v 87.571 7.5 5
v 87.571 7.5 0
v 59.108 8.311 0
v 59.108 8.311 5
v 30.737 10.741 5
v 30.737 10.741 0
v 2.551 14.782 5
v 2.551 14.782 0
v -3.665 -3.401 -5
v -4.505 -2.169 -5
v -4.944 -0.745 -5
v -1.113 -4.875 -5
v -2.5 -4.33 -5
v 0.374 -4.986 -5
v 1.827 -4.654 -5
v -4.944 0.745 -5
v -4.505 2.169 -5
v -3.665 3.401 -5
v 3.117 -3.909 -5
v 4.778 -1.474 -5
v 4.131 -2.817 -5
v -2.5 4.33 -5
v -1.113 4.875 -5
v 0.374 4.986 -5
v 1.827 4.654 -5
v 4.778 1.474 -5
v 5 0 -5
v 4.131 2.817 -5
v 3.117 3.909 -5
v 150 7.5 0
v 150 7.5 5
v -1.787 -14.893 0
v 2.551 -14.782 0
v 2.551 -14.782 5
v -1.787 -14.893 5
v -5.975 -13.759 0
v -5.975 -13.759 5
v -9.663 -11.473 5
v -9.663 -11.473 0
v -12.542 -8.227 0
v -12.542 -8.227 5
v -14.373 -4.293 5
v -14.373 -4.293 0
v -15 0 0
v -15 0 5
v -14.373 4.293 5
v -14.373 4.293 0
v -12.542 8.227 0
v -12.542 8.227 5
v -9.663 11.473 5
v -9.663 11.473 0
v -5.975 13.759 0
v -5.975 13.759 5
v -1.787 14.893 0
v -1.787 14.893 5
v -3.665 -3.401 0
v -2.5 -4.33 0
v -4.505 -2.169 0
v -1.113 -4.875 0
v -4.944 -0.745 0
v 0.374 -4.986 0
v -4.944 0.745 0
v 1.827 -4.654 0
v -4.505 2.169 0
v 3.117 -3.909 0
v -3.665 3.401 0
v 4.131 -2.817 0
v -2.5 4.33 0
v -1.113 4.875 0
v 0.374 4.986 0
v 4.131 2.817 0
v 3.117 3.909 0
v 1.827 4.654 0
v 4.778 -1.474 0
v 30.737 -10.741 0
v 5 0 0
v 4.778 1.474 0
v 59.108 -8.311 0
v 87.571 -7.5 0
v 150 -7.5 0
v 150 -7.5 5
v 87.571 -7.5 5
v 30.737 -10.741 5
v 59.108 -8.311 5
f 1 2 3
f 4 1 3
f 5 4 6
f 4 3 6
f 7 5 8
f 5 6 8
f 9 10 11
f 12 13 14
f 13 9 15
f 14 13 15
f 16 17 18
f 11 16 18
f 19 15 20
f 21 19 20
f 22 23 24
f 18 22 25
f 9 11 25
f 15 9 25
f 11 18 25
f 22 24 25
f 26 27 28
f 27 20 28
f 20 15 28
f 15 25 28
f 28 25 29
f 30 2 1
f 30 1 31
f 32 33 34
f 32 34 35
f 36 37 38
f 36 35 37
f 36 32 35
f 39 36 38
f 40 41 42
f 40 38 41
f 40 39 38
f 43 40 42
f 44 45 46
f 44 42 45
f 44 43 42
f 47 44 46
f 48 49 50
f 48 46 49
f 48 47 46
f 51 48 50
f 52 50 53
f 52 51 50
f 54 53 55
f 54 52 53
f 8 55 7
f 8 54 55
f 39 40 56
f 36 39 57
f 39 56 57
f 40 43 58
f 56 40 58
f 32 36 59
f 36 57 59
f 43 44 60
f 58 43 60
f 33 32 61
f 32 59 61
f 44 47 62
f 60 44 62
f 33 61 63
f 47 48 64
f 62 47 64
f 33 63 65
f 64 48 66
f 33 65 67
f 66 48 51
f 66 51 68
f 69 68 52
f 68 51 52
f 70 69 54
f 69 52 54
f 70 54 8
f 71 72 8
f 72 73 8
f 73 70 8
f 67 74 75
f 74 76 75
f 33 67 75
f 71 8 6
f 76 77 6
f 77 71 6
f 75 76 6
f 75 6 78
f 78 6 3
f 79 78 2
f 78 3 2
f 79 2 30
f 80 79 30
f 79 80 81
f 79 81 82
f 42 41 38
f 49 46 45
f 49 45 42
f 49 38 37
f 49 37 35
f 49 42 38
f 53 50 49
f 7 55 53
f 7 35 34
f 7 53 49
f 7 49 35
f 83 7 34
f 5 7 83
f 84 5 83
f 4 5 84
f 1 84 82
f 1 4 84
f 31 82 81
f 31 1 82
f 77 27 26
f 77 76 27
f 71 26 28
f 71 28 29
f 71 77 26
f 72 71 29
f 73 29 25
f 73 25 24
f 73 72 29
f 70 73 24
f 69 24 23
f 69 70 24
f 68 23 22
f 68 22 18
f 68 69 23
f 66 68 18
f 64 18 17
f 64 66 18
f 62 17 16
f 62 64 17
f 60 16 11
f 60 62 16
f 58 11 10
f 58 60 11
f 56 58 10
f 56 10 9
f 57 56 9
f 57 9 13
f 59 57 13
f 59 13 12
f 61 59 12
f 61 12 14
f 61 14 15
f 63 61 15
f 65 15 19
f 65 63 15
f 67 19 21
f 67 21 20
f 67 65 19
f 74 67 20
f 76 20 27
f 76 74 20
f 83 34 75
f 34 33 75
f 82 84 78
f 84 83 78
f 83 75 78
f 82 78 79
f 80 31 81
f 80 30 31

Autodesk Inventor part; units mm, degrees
ref_plane "YZ Plane" through (0, 0, 0) normal (1, 0, 0) x (0, 1, 0)
ref_plane "XZ Plane" through (0, 0, 0) normal (0, 1, 0) x (-1, 0, 0)
ref_plane "XY Plane" through (0, 0, 0) normal (0, 0, 1) x (1, 0, 0)
sketch "Эскиз1" plane through (0, 0, 0) normal (0, 0, 1) x (1, 0, 0)
  arc A0 (2.5506, 14.7816) -> (2.5506, -14.7816) centre (0, 0) ccw
  line L0 (87.5714, 7.5) -> (150, 7.5)
  line L1 (150, 7.5) -> (150, -7.5)
  line L2 (150, -7.5) -> (87.5714, -7.5)
  arc A1 (2.5506, 14.7816) -> (87.5714, 7.5) centre (87.5714, 507.5) ccw
  arc A2 (87.5714, -7.5) -> (2.5506, -14.7816) centre (87.5714, -507.5) ccw
  point P0 (12.9904, 7.5)
  point P1 (12.9904, -7.5)
  point P2 (12.9904, 7.5)
  point P3 (12.9904, -7.5)
  dimension "d0" = 30
  dimension "d1" = 150
  dimension "d13" = 15
  dimension "d14" = 7.5
  dimension "d19" = 500
extrude "Выдавливание1" add sketch "Эскиз1" along normal blind 5
sketch "Эскиз2" plane through (0, 0, 5) normal (0, 0, 1) x (1, 0, 0)
  arc A0 (2.5506, 14.7816) -> (2.5506, -14.7816) centre (0, 0) ccw projected
  circle A1 centre (0, 0) radius 5
  point P0 (7.7262, 12.8571)
  point P1 (7.7262, -12.8571)
  dimension "d16" = 10
extrude "Выдавливание2" add sketch "Эскиз2" against normal blind 10
equation "\"d14\" = 0.5 * d13"
properties part number "Рычаг_2"
